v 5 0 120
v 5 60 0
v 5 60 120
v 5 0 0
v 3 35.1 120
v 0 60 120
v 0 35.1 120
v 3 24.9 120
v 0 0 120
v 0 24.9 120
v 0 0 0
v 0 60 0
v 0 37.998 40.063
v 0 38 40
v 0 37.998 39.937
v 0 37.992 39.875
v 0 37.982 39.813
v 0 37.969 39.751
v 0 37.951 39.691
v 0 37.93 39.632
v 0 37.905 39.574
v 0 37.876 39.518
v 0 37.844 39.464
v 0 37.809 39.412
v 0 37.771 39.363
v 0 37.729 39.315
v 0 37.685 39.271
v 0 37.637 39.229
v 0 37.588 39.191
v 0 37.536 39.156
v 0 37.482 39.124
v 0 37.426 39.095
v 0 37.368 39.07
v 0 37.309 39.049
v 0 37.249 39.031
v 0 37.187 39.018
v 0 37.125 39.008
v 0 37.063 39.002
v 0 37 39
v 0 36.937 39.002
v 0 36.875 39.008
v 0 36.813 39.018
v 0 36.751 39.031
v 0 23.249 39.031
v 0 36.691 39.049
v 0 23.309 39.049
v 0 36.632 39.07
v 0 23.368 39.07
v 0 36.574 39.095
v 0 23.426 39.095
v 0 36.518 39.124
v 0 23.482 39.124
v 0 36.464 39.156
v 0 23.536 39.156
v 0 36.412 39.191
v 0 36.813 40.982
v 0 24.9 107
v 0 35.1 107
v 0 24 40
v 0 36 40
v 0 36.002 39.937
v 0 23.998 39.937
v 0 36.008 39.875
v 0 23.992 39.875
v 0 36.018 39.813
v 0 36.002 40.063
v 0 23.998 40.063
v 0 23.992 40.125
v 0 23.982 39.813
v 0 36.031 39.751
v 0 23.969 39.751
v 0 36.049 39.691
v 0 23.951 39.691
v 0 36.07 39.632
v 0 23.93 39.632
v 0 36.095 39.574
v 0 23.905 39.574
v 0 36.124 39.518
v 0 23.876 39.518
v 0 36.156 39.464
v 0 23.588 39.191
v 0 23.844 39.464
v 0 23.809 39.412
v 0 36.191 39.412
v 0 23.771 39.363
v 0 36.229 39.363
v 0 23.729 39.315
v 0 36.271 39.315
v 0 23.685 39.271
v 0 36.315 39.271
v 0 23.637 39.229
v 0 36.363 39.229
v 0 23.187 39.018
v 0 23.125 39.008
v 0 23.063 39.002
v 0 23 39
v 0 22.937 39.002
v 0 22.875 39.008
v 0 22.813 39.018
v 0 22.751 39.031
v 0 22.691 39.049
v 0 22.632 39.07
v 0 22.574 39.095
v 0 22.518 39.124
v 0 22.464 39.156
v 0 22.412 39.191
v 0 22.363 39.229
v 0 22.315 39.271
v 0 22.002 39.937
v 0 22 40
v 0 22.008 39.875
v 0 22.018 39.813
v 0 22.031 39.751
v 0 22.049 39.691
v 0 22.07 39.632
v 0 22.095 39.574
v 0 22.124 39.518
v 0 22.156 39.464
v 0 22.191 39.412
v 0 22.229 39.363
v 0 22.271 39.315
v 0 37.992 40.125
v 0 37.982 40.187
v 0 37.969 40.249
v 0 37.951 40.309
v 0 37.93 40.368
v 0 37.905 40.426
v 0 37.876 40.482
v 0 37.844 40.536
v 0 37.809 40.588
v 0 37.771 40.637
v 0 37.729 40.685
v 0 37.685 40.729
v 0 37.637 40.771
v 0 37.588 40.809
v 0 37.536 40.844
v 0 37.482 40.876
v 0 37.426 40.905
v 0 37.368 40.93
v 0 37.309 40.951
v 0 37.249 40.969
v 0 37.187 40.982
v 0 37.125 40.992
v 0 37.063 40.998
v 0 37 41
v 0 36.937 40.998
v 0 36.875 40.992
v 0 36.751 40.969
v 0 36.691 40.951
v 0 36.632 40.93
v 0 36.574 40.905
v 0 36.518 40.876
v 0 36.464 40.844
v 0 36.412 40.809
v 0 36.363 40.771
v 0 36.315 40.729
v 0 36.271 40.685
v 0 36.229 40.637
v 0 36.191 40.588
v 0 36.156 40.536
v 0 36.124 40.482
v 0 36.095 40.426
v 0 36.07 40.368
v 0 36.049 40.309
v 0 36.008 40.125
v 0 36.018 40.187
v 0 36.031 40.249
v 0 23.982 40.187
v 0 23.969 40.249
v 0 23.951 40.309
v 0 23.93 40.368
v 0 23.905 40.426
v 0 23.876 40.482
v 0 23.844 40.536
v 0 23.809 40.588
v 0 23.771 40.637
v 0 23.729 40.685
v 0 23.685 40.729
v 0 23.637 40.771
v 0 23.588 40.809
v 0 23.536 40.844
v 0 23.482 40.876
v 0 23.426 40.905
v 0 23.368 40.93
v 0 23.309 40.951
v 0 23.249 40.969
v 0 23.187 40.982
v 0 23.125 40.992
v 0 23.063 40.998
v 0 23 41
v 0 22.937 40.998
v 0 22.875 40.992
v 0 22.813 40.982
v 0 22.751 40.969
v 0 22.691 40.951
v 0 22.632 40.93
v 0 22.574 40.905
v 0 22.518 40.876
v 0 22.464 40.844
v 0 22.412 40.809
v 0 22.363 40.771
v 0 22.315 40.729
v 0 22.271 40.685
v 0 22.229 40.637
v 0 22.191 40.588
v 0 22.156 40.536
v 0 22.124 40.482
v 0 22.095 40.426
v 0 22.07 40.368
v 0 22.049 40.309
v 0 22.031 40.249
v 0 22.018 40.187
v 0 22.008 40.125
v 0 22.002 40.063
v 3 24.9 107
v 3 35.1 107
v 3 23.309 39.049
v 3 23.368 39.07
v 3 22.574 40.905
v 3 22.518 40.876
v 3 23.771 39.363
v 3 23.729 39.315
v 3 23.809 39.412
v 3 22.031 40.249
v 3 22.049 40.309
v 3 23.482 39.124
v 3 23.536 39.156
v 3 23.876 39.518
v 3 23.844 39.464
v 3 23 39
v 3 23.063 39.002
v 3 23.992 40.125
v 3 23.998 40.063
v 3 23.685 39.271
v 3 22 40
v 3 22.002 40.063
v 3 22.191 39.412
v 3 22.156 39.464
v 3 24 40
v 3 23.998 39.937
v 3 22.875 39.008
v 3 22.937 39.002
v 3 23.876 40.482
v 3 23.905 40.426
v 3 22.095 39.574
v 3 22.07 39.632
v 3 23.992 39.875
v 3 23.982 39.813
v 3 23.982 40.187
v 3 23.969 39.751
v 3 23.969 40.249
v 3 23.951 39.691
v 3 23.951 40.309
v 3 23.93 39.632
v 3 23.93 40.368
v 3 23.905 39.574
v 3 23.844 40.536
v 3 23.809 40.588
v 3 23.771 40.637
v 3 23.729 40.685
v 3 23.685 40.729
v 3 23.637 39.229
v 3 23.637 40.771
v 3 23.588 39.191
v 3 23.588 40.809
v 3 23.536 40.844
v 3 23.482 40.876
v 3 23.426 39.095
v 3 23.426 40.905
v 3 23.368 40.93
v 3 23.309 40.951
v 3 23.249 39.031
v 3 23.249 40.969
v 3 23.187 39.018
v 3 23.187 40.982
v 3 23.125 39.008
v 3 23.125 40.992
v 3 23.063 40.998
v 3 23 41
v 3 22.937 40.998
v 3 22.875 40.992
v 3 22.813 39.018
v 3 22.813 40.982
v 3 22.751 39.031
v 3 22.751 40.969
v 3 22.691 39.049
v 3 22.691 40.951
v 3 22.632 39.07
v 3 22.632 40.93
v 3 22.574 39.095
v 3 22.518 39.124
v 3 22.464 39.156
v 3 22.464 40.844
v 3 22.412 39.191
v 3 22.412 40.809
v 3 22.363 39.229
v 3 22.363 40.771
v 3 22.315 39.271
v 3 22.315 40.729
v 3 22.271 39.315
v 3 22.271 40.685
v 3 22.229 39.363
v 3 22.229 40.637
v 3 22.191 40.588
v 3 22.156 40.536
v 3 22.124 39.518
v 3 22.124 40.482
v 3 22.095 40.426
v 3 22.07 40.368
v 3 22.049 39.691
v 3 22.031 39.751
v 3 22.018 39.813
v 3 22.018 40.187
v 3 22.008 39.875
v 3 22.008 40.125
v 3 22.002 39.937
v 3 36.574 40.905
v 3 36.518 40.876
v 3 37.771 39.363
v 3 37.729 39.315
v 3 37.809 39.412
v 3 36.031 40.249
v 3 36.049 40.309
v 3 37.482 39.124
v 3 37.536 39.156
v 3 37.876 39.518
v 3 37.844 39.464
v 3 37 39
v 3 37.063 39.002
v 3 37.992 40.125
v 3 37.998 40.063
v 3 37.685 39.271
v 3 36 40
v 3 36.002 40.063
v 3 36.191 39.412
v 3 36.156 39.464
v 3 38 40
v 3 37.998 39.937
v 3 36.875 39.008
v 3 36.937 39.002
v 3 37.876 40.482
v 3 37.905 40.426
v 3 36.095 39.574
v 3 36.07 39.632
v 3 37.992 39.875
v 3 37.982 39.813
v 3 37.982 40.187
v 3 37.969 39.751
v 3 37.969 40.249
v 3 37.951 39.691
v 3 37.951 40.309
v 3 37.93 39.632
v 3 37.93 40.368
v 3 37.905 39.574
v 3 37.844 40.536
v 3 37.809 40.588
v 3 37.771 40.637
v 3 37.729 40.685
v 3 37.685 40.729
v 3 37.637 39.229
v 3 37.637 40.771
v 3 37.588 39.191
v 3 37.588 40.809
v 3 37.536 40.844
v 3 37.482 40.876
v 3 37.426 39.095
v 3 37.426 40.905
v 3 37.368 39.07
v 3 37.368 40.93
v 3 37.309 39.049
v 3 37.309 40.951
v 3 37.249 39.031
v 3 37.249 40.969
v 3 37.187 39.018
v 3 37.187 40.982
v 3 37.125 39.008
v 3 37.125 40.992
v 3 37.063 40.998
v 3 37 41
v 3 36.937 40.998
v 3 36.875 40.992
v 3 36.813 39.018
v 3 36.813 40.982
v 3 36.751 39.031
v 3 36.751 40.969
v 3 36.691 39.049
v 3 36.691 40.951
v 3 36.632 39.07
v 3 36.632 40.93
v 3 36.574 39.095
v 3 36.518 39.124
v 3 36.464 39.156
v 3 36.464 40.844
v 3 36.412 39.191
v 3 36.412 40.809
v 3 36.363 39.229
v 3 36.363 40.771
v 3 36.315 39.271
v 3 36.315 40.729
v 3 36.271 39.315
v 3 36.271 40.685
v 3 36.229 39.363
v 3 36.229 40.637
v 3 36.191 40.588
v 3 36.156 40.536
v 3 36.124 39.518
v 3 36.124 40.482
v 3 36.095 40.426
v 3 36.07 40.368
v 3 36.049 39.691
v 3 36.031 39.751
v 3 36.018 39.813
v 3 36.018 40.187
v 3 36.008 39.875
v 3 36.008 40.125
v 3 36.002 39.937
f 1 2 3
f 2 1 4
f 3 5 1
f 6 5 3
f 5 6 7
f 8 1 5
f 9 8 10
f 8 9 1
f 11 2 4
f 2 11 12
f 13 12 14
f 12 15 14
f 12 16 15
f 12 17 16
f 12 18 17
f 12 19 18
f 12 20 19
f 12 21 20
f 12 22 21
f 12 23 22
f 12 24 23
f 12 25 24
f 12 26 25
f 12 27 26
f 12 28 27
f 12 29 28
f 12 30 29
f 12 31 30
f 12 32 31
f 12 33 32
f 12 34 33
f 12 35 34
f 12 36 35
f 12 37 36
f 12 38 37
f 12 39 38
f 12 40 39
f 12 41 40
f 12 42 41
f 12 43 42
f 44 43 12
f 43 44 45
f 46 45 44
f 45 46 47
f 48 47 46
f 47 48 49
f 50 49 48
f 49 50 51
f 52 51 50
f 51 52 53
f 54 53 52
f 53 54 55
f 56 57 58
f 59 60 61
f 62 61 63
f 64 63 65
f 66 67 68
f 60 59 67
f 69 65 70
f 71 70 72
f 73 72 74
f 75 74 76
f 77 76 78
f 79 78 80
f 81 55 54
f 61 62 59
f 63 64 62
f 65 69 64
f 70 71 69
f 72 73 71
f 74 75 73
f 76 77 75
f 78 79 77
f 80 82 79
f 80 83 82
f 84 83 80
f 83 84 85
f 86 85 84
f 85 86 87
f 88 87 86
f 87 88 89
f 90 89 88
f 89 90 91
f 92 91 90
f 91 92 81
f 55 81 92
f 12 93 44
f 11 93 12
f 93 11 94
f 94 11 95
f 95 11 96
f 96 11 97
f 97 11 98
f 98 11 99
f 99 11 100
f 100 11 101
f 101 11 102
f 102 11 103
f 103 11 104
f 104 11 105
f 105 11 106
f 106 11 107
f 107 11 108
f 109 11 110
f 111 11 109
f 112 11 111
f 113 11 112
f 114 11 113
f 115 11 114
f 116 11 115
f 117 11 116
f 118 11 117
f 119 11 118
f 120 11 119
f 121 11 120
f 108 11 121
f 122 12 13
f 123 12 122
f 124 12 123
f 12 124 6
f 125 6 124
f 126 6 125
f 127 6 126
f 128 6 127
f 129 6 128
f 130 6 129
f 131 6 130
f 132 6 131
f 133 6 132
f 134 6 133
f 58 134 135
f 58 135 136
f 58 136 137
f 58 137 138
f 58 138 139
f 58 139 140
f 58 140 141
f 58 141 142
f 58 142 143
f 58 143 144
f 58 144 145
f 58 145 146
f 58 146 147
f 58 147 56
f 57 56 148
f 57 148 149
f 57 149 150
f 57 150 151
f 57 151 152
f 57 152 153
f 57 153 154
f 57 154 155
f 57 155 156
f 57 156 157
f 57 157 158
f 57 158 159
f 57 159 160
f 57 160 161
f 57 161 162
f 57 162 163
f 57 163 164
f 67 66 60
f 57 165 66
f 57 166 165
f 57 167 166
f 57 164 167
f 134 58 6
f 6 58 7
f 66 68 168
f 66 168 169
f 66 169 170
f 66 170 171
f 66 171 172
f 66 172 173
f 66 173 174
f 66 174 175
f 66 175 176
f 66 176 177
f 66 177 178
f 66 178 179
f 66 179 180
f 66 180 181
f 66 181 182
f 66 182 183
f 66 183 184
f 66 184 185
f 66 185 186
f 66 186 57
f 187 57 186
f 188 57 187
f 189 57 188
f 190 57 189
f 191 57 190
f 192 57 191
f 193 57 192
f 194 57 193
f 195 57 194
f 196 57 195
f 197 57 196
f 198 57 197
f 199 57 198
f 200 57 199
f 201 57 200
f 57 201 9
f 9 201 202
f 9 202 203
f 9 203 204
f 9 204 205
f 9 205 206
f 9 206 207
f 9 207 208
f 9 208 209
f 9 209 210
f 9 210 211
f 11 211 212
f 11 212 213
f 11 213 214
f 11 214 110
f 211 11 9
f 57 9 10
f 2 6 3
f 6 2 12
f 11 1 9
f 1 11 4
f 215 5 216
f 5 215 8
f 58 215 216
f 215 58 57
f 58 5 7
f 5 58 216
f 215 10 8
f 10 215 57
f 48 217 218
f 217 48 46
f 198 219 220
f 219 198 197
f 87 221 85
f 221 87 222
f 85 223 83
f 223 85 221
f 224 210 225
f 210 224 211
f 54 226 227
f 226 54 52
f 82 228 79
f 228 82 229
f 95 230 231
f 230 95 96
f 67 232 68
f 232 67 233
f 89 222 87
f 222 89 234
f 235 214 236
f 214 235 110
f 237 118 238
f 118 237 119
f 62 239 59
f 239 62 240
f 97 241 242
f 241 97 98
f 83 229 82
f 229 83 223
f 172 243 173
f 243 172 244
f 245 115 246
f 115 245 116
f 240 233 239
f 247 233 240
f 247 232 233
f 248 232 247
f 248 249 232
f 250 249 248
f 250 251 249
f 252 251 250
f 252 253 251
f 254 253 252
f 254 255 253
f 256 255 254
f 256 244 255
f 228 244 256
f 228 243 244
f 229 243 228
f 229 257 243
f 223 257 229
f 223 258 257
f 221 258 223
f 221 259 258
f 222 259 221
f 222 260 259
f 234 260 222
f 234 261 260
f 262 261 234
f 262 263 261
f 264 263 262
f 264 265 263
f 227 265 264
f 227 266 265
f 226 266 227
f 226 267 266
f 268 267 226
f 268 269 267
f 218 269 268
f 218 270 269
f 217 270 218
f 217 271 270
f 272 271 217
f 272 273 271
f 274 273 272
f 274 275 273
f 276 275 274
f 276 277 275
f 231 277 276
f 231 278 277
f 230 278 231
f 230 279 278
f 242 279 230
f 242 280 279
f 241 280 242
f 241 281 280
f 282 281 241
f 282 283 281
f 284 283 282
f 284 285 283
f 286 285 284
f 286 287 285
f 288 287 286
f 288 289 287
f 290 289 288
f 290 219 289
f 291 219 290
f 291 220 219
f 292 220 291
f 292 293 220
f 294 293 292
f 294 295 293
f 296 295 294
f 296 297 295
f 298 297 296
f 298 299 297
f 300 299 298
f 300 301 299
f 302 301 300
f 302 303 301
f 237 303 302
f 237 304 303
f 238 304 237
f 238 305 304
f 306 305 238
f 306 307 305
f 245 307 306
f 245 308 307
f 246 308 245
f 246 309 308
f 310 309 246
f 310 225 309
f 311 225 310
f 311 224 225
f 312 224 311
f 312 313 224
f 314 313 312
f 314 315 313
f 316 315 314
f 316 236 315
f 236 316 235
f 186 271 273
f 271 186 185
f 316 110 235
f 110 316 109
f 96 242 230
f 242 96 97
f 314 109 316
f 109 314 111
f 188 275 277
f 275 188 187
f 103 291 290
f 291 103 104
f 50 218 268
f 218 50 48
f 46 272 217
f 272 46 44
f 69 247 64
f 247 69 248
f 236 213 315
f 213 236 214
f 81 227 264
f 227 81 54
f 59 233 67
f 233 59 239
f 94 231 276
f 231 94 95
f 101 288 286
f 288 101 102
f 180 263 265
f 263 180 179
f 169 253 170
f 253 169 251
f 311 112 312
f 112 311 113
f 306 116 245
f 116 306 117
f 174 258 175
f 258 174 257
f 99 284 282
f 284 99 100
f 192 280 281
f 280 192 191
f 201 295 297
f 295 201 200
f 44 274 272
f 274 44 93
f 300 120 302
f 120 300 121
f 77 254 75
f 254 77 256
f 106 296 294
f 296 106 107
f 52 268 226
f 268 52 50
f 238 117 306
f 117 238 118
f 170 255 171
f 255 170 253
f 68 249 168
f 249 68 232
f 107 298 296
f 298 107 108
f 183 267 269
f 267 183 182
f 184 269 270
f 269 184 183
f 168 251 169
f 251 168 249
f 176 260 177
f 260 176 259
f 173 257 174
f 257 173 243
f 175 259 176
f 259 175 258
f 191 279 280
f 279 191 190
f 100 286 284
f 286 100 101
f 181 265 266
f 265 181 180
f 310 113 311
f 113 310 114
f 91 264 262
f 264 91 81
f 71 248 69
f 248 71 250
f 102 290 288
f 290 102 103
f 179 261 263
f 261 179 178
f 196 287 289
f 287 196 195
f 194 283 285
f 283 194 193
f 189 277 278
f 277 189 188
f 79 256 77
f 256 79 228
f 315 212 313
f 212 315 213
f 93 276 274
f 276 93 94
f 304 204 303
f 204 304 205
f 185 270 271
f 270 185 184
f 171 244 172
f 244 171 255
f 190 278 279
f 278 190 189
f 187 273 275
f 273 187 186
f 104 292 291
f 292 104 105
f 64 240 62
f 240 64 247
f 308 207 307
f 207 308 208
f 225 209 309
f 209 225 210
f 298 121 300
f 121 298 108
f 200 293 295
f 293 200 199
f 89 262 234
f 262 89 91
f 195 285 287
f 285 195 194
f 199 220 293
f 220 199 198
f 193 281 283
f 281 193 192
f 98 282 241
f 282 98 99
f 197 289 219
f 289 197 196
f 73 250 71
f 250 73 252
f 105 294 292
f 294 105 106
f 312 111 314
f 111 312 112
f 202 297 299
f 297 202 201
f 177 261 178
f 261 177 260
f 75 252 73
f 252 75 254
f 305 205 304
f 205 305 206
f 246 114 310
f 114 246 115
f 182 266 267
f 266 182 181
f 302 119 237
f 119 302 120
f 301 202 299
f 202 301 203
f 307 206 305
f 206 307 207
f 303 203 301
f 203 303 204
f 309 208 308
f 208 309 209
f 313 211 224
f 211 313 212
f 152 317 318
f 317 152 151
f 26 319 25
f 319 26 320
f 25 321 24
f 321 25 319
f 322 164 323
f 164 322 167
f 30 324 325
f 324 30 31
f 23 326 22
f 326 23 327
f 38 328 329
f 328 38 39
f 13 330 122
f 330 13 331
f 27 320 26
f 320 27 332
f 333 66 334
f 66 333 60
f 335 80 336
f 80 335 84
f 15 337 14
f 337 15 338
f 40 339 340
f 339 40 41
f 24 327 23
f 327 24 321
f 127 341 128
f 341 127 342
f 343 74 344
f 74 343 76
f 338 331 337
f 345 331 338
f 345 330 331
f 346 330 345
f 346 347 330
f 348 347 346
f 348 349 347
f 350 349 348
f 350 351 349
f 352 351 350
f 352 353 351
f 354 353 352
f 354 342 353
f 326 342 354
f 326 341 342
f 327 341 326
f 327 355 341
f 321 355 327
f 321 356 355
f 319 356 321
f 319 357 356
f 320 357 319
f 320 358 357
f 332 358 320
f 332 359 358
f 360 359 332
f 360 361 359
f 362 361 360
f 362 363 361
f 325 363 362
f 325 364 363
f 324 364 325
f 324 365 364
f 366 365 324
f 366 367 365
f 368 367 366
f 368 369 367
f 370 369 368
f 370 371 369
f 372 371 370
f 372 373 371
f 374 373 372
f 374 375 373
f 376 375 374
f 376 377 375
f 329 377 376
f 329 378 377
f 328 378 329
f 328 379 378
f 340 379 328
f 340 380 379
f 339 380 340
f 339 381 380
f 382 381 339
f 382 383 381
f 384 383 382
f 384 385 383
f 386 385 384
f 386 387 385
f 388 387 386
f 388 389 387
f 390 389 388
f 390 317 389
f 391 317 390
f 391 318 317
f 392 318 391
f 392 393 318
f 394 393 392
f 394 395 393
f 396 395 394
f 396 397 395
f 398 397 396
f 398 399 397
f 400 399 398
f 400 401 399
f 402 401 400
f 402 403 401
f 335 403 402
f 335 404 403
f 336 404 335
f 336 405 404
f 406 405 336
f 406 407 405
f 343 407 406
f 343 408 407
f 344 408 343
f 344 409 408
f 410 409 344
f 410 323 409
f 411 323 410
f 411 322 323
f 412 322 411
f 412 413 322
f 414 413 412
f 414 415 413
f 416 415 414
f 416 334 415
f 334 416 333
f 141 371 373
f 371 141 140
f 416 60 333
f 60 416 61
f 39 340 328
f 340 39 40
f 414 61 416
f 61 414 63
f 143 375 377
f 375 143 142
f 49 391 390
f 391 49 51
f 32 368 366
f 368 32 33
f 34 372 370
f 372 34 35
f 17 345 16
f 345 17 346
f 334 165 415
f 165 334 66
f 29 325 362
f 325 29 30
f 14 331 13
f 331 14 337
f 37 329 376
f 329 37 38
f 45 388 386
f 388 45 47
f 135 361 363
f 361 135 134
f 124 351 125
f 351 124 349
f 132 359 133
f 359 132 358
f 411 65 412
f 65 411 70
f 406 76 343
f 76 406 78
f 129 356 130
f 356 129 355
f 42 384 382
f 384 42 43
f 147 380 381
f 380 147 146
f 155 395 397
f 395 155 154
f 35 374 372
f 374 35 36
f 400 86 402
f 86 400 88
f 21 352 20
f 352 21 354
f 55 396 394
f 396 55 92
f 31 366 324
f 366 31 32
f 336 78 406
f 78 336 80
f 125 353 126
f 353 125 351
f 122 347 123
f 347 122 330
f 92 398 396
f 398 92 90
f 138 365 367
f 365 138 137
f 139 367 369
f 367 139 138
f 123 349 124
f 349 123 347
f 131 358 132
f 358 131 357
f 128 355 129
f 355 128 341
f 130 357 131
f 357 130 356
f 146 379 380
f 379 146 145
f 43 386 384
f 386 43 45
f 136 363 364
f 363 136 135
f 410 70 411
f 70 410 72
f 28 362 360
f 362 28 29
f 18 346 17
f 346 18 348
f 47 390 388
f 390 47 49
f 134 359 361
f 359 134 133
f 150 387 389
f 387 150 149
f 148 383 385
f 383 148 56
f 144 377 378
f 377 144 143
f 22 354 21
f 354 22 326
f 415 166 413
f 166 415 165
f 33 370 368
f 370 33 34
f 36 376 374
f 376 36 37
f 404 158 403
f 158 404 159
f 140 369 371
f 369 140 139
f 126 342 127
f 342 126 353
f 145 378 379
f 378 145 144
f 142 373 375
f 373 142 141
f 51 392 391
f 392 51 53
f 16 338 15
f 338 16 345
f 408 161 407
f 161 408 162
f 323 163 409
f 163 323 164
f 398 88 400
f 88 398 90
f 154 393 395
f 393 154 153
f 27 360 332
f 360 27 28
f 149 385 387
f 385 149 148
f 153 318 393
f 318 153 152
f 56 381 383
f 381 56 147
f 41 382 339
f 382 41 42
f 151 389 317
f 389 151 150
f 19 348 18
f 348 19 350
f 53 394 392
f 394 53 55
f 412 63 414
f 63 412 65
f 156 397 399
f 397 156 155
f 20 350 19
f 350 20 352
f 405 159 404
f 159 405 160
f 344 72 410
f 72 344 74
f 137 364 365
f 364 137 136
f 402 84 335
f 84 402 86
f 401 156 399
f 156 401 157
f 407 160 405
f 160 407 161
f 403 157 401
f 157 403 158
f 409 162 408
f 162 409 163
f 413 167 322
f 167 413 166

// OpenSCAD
RightWall();
module RightWall(){
    difference(){
        cube([5,60,120]);        
            
    translate([-0.5,24.9,107])
        cube([3.5,10.2,15]);
        
        #rotate([0,90,0])
        translate([-40,23,-3])
 cylinder(6,1, $fn=100);
        
        #rotate([0,90,0])
        translate([-40,37,-3])
 cylinder(6,1, $fn=100);
    }
}
